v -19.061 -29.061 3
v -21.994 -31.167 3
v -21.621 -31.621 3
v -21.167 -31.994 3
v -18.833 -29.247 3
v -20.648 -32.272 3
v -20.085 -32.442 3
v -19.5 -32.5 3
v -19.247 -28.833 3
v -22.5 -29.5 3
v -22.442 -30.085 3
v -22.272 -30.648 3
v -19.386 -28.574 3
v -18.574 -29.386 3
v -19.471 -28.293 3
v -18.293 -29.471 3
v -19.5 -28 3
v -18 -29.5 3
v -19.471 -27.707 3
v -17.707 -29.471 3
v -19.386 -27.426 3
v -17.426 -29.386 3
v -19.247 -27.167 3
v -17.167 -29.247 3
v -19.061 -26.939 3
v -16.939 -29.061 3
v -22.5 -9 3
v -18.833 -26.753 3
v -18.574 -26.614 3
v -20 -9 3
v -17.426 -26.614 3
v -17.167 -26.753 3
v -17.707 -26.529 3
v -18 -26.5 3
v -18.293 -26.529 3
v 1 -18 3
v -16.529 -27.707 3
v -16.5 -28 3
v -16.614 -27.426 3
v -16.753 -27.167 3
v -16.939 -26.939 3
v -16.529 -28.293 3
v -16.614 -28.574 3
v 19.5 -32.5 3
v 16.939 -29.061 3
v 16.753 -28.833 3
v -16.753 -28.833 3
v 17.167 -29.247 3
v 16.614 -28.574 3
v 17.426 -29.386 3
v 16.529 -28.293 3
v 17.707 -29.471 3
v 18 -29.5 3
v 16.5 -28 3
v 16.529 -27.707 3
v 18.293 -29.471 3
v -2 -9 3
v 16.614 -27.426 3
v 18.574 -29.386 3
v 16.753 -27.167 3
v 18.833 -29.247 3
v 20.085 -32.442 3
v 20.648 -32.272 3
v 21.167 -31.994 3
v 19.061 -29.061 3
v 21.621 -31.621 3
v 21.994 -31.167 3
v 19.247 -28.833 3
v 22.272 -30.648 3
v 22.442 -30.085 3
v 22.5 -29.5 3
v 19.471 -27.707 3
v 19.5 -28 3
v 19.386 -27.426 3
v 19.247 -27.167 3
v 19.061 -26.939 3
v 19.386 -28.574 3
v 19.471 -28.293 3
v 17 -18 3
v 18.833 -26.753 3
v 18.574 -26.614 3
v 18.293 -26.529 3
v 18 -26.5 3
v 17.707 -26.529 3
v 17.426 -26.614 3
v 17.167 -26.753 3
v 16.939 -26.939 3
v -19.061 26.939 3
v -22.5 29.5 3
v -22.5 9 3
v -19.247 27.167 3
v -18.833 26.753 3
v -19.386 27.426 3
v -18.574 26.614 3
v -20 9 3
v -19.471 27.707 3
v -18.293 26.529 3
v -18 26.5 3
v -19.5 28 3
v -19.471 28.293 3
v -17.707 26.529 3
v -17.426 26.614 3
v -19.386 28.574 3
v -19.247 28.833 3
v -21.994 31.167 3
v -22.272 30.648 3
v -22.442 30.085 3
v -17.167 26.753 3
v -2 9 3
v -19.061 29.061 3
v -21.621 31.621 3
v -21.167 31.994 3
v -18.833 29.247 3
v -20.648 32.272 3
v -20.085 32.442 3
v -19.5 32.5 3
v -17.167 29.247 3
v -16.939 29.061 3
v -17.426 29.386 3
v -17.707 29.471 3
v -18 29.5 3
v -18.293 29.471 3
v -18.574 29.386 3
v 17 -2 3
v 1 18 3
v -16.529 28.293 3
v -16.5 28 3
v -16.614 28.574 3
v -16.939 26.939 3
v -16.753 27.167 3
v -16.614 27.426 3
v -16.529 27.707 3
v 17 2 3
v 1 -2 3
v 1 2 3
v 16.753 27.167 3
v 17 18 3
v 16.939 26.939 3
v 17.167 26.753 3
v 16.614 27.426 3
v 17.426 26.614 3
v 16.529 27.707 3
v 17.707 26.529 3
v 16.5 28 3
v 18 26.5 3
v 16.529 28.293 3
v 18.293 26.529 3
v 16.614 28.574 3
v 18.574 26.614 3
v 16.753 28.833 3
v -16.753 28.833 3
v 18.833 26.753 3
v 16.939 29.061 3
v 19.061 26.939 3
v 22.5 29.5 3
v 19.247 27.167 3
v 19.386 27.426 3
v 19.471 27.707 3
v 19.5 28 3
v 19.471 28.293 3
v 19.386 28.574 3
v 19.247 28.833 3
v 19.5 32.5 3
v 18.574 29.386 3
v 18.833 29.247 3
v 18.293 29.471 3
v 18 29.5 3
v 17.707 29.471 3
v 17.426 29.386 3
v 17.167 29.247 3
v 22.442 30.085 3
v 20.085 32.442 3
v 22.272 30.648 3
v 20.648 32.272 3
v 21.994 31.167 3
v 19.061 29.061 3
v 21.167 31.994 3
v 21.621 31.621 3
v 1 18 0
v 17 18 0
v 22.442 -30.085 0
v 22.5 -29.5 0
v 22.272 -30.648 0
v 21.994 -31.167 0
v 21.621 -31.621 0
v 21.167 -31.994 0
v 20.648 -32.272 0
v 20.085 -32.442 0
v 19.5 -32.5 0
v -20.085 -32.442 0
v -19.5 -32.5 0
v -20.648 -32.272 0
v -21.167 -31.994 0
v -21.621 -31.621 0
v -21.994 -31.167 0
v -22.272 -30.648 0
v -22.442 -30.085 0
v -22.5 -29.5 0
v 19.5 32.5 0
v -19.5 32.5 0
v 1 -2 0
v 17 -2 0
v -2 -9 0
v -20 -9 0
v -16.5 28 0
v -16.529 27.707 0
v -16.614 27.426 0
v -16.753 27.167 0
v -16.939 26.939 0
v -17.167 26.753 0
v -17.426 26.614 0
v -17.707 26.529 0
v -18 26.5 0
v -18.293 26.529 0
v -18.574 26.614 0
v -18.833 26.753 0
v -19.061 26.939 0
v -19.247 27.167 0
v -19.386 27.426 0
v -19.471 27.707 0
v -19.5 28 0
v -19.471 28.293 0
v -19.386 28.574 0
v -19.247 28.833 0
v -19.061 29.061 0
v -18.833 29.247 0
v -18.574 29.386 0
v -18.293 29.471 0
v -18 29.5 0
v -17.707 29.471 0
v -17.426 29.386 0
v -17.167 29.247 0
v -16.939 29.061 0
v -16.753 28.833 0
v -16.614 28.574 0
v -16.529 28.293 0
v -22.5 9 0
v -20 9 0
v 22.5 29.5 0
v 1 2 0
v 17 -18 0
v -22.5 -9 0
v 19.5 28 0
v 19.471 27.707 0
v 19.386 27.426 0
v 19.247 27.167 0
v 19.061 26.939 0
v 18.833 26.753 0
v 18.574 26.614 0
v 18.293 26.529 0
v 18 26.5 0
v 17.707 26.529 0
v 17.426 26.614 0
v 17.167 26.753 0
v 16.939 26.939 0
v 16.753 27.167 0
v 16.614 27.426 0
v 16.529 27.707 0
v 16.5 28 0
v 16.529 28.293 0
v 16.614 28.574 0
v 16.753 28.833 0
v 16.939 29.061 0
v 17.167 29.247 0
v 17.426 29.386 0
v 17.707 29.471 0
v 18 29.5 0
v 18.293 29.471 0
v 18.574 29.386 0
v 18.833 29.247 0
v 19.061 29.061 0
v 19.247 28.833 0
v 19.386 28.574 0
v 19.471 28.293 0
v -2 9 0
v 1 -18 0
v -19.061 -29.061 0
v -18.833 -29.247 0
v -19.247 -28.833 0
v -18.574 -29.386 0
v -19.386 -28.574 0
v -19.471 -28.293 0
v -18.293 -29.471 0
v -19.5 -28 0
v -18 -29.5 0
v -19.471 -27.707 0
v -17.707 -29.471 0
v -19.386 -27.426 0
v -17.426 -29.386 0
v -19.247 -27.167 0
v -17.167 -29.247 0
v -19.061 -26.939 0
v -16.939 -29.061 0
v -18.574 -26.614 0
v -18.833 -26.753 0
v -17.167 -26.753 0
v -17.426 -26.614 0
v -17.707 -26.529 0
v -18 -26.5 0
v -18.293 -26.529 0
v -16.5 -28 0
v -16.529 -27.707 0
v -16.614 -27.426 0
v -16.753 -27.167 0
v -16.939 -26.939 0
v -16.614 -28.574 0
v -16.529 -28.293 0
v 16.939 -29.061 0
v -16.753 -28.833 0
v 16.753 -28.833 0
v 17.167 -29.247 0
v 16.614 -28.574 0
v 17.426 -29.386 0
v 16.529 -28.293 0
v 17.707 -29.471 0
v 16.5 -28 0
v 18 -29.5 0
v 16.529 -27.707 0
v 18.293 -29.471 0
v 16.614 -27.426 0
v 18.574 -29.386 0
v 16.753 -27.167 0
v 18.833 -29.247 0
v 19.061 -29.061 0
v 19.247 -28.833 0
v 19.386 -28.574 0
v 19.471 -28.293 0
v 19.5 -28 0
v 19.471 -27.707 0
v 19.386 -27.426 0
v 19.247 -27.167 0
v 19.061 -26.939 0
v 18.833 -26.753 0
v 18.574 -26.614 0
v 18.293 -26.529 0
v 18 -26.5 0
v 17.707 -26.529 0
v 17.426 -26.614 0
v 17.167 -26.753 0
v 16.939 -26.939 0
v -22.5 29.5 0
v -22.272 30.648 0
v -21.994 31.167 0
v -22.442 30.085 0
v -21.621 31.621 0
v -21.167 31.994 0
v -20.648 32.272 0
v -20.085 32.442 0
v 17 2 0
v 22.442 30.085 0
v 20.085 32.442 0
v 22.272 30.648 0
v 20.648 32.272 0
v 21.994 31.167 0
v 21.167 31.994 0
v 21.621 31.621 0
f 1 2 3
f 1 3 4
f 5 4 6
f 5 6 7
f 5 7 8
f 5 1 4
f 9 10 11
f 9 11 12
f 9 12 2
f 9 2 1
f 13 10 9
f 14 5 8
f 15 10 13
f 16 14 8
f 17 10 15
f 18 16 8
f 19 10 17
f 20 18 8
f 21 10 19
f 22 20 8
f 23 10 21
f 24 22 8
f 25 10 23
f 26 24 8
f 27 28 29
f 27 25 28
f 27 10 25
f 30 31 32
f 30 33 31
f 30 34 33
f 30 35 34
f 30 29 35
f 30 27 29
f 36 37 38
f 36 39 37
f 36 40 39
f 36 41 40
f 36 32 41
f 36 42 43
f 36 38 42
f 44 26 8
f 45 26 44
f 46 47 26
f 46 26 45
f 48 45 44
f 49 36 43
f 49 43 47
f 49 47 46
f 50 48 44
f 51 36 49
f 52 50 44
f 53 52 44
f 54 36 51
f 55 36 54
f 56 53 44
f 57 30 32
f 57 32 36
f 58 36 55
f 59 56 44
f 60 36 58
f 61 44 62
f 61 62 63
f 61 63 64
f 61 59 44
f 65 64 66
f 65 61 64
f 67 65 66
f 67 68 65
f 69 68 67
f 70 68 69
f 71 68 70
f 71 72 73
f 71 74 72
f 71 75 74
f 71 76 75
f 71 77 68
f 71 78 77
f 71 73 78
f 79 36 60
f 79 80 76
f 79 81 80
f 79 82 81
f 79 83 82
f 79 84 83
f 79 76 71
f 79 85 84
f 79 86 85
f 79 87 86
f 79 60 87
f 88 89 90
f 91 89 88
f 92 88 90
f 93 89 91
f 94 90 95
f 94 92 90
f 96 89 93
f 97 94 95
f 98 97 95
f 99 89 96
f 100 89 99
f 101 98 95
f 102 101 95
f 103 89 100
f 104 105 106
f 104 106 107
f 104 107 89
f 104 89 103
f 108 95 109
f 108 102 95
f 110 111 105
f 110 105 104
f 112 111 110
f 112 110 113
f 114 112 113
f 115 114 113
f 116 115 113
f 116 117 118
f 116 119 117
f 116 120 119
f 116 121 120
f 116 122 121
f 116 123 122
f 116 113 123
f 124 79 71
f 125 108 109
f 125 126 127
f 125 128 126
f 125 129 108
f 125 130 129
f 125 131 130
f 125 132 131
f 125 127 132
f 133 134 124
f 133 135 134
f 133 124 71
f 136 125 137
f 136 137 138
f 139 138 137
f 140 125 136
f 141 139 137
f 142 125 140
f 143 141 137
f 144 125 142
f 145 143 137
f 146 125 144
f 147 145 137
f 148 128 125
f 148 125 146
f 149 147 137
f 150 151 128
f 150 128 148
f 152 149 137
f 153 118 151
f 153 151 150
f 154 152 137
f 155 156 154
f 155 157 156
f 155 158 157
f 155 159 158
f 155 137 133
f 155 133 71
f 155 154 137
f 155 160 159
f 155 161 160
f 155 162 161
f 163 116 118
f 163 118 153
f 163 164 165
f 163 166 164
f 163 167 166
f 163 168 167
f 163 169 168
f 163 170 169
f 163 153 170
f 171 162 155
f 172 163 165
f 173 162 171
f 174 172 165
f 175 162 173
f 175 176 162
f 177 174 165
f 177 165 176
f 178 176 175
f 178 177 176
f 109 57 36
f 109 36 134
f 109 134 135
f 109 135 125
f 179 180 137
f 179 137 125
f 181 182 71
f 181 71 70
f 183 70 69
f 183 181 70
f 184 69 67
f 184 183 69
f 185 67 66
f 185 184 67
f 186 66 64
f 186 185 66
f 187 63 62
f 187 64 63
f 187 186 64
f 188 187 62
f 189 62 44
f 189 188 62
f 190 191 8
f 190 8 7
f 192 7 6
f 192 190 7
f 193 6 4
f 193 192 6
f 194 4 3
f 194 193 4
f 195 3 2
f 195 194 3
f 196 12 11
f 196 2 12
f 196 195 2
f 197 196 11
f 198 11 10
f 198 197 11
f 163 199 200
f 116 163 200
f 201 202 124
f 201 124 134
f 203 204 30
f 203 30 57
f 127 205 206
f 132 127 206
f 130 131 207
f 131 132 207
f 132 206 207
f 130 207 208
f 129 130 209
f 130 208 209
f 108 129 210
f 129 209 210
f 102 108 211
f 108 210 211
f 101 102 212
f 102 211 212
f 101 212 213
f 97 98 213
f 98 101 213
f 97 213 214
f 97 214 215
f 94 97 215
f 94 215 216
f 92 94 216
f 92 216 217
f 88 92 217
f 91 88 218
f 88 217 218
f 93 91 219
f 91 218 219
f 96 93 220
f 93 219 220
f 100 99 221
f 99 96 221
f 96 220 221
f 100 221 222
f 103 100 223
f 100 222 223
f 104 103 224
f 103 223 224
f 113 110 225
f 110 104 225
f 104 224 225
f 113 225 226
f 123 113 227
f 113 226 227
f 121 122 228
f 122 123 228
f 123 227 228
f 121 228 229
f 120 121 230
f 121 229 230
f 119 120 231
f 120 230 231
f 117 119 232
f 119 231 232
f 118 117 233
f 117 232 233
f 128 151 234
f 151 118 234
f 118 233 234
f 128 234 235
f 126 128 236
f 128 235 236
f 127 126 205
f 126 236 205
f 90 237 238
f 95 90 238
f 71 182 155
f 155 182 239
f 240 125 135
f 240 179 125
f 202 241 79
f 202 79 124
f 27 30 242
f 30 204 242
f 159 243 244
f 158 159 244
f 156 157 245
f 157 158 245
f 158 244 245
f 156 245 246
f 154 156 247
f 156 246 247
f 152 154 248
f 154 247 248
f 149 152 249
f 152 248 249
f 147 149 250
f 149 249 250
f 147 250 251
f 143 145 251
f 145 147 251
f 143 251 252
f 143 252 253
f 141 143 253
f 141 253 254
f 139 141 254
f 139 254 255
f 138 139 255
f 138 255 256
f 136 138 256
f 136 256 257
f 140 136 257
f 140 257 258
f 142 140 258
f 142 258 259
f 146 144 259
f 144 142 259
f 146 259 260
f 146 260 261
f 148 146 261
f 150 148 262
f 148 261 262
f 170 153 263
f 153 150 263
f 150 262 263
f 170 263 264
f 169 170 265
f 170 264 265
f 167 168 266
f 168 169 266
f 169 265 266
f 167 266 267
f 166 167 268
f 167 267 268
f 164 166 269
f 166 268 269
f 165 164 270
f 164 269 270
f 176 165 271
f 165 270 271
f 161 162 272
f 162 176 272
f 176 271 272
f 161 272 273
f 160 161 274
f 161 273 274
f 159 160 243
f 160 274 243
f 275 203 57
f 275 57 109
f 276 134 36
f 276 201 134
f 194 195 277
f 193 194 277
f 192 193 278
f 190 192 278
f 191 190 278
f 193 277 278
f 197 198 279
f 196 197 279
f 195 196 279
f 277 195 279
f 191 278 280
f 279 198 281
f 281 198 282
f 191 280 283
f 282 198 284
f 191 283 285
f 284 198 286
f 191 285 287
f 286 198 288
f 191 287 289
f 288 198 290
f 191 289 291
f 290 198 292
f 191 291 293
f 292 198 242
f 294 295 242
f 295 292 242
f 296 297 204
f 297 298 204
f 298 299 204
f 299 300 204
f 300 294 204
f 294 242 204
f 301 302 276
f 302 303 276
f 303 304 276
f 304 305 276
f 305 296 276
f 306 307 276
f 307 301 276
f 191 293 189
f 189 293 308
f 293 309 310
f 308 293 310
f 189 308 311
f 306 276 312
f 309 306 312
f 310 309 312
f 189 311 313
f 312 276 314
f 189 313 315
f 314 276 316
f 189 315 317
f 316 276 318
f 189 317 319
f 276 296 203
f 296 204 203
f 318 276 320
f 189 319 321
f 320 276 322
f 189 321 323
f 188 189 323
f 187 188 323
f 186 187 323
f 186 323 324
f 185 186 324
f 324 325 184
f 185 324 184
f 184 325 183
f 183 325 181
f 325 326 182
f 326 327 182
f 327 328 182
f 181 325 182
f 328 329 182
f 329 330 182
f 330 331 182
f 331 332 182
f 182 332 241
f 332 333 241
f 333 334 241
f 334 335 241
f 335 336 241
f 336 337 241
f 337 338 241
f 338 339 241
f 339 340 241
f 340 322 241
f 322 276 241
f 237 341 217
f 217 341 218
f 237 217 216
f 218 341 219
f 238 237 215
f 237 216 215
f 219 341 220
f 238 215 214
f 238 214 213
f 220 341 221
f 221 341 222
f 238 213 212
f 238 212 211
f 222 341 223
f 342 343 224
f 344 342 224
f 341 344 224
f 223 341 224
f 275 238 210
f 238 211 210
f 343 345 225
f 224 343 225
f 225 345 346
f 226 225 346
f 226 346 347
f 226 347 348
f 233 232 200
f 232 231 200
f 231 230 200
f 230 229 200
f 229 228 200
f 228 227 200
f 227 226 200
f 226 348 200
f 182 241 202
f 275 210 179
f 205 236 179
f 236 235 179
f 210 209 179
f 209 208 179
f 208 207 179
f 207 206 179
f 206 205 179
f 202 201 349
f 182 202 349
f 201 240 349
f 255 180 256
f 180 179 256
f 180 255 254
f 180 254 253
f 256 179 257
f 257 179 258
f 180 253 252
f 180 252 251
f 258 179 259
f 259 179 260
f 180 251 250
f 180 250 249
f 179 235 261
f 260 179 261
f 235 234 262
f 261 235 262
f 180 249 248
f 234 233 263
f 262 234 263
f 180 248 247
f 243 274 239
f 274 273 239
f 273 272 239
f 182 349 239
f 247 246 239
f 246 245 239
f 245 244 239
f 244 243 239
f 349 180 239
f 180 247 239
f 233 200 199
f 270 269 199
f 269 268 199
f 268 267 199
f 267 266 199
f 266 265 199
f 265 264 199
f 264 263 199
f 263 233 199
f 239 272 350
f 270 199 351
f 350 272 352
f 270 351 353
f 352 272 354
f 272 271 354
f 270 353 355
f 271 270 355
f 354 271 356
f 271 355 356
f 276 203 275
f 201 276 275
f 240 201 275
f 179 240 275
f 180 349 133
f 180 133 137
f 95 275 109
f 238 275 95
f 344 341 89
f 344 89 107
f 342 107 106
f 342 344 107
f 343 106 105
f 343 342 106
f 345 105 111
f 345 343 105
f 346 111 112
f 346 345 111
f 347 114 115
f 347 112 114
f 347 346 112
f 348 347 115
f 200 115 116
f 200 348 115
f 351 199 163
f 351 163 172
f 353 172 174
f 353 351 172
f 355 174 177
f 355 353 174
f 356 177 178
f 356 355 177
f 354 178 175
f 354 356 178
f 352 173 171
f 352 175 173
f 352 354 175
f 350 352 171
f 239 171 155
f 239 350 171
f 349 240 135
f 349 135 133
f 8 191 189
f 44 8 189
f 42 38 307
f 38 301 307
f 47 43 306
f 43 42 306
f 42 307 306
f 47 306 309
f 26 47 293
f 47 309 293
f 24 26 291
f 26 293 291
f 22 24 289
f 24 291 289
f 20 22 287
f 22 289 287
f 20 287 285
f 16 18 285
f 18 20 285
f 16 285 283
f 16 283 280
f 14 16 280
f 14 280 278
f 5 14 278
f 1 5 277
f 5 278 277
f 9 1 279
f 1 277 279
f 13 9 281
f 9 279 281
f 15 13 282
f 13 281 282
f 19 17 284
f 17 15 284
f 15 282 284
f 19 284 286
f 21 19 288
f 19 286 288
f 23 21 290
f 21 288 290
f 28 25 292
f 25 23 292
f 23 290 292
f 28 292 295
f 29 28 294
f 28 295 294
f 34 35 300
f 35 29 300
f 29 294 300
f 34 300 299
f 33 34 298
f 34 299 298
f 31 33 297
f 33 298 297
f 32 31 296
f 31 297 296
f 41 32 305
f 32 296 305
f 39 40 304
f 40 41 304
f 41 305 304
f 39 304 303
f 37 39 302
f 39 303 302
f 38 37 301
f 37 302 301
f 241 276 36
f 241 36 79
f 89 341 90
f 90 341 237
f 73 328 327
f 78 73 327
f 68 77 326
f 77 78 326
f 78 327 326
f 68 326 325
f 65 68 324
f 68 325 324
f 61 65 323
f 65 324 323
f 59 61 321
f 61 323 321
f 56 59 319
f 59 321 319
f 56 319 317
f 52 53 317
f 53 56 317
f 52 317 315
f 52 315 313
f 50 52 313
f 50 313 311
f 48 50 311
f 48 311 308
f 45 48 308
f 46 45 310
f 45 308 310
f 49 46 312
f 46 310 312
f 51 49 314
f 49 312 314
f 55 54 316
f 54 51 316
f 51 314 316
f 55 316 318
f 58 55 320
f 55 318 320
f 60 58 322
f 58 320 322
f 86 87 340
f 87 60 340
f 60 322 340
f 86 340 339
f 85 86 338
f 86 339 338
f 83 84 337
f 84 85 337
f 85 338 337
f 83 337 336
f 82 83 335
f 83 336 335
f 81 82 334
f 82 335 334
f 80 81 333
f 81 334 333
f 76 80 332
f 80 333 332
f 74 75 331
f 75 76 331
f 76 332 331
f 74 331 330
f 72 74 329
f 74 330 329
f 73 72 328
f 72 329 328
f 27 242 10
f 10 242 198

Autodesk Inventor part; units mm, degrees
ref_plane "YZ Plane" through (0, 0, 0) normal (1, 0, 0) x (0, 1, 0)
ref_plane "XZ Plane" through (0, 0, 0) normal (0, 1, 0) x (-1, 0, 0)
ref_plane "XY Plane" through (0, 0, 0) normal (0, 0, 1) x (1, 0, 0)
sketch "Эскиз1" plane through (0, 0, 0) normal (0, 0, 1) x (1, 0, 0)
  arc A0 (22.5, 29.5) -> (19.5, 32.5) centre (19.5, 29.5) ccw projected
  line L0 (22.5, -29.5) -> (22.5, 29.5) projected
  arc A1 (19.5, -32.5) -> (22.5, -29.5) centre (19.5, -29.5) ccw projected
  line L1 (-19.5, -32.5) -> (19.5, -32.5) projected
  line L2 (19.5, 32.5) -> (-19.5, 32.5) projected
  arc A2 (-19.5, 32.5) -> (-22.5, 29.5) centre (-19.5, 29.5) ccw projected
  line L3 (-22.5, 29.5) -> (-22.5, 9) projected
  line L4 (-22.5, -9) -> (-22.5, -29.5) projected
  arc A3 (-22.5, -29.5) -> (-19.5, -32.5) centre (-19.5, -29.5) ccw projected
  circle A4 centre (-18, -28) radius 1.5 projected
  circle A5 centre (18, -28) radius 1.5 projected
  circle A6 centre (18, 28) radius 1.5 projected
  circle A7 centre (-18, 28) radius 1.5 projected
  line L5 (-2, 9) -> (-20, 9) projected
  line L6 (-22.5, 9) -> (-20, 9) projected
  line L7 (-2, -9) -> (-2, 9) projected
  line L8 (-20, -9) -> (-2, -9) projected
  line L9 (-20, -9) -> (-22.5, -9) projected
  line L10 (1, -2) -> (1, -18) projected
  line L11 (1, -18) -> (17, -18) projected
  line L12 (17, -18) -> (17, -2) projected
  line L13 (17, -2) -> (1, -2) projected
  line L14 (1, 18) -> (1, 2) projected
  line L15 (1, 2) -> (17, 2) projected
  line L16 (17, 2) -> (17, 18) projected
  line L17 (17, 18) -> (1, 18) projected
  point P0 (0, 0)
extrude "Выдавливание1" add sketch "Эскиз1" along normal blind 3
properties part number "level2_up"
